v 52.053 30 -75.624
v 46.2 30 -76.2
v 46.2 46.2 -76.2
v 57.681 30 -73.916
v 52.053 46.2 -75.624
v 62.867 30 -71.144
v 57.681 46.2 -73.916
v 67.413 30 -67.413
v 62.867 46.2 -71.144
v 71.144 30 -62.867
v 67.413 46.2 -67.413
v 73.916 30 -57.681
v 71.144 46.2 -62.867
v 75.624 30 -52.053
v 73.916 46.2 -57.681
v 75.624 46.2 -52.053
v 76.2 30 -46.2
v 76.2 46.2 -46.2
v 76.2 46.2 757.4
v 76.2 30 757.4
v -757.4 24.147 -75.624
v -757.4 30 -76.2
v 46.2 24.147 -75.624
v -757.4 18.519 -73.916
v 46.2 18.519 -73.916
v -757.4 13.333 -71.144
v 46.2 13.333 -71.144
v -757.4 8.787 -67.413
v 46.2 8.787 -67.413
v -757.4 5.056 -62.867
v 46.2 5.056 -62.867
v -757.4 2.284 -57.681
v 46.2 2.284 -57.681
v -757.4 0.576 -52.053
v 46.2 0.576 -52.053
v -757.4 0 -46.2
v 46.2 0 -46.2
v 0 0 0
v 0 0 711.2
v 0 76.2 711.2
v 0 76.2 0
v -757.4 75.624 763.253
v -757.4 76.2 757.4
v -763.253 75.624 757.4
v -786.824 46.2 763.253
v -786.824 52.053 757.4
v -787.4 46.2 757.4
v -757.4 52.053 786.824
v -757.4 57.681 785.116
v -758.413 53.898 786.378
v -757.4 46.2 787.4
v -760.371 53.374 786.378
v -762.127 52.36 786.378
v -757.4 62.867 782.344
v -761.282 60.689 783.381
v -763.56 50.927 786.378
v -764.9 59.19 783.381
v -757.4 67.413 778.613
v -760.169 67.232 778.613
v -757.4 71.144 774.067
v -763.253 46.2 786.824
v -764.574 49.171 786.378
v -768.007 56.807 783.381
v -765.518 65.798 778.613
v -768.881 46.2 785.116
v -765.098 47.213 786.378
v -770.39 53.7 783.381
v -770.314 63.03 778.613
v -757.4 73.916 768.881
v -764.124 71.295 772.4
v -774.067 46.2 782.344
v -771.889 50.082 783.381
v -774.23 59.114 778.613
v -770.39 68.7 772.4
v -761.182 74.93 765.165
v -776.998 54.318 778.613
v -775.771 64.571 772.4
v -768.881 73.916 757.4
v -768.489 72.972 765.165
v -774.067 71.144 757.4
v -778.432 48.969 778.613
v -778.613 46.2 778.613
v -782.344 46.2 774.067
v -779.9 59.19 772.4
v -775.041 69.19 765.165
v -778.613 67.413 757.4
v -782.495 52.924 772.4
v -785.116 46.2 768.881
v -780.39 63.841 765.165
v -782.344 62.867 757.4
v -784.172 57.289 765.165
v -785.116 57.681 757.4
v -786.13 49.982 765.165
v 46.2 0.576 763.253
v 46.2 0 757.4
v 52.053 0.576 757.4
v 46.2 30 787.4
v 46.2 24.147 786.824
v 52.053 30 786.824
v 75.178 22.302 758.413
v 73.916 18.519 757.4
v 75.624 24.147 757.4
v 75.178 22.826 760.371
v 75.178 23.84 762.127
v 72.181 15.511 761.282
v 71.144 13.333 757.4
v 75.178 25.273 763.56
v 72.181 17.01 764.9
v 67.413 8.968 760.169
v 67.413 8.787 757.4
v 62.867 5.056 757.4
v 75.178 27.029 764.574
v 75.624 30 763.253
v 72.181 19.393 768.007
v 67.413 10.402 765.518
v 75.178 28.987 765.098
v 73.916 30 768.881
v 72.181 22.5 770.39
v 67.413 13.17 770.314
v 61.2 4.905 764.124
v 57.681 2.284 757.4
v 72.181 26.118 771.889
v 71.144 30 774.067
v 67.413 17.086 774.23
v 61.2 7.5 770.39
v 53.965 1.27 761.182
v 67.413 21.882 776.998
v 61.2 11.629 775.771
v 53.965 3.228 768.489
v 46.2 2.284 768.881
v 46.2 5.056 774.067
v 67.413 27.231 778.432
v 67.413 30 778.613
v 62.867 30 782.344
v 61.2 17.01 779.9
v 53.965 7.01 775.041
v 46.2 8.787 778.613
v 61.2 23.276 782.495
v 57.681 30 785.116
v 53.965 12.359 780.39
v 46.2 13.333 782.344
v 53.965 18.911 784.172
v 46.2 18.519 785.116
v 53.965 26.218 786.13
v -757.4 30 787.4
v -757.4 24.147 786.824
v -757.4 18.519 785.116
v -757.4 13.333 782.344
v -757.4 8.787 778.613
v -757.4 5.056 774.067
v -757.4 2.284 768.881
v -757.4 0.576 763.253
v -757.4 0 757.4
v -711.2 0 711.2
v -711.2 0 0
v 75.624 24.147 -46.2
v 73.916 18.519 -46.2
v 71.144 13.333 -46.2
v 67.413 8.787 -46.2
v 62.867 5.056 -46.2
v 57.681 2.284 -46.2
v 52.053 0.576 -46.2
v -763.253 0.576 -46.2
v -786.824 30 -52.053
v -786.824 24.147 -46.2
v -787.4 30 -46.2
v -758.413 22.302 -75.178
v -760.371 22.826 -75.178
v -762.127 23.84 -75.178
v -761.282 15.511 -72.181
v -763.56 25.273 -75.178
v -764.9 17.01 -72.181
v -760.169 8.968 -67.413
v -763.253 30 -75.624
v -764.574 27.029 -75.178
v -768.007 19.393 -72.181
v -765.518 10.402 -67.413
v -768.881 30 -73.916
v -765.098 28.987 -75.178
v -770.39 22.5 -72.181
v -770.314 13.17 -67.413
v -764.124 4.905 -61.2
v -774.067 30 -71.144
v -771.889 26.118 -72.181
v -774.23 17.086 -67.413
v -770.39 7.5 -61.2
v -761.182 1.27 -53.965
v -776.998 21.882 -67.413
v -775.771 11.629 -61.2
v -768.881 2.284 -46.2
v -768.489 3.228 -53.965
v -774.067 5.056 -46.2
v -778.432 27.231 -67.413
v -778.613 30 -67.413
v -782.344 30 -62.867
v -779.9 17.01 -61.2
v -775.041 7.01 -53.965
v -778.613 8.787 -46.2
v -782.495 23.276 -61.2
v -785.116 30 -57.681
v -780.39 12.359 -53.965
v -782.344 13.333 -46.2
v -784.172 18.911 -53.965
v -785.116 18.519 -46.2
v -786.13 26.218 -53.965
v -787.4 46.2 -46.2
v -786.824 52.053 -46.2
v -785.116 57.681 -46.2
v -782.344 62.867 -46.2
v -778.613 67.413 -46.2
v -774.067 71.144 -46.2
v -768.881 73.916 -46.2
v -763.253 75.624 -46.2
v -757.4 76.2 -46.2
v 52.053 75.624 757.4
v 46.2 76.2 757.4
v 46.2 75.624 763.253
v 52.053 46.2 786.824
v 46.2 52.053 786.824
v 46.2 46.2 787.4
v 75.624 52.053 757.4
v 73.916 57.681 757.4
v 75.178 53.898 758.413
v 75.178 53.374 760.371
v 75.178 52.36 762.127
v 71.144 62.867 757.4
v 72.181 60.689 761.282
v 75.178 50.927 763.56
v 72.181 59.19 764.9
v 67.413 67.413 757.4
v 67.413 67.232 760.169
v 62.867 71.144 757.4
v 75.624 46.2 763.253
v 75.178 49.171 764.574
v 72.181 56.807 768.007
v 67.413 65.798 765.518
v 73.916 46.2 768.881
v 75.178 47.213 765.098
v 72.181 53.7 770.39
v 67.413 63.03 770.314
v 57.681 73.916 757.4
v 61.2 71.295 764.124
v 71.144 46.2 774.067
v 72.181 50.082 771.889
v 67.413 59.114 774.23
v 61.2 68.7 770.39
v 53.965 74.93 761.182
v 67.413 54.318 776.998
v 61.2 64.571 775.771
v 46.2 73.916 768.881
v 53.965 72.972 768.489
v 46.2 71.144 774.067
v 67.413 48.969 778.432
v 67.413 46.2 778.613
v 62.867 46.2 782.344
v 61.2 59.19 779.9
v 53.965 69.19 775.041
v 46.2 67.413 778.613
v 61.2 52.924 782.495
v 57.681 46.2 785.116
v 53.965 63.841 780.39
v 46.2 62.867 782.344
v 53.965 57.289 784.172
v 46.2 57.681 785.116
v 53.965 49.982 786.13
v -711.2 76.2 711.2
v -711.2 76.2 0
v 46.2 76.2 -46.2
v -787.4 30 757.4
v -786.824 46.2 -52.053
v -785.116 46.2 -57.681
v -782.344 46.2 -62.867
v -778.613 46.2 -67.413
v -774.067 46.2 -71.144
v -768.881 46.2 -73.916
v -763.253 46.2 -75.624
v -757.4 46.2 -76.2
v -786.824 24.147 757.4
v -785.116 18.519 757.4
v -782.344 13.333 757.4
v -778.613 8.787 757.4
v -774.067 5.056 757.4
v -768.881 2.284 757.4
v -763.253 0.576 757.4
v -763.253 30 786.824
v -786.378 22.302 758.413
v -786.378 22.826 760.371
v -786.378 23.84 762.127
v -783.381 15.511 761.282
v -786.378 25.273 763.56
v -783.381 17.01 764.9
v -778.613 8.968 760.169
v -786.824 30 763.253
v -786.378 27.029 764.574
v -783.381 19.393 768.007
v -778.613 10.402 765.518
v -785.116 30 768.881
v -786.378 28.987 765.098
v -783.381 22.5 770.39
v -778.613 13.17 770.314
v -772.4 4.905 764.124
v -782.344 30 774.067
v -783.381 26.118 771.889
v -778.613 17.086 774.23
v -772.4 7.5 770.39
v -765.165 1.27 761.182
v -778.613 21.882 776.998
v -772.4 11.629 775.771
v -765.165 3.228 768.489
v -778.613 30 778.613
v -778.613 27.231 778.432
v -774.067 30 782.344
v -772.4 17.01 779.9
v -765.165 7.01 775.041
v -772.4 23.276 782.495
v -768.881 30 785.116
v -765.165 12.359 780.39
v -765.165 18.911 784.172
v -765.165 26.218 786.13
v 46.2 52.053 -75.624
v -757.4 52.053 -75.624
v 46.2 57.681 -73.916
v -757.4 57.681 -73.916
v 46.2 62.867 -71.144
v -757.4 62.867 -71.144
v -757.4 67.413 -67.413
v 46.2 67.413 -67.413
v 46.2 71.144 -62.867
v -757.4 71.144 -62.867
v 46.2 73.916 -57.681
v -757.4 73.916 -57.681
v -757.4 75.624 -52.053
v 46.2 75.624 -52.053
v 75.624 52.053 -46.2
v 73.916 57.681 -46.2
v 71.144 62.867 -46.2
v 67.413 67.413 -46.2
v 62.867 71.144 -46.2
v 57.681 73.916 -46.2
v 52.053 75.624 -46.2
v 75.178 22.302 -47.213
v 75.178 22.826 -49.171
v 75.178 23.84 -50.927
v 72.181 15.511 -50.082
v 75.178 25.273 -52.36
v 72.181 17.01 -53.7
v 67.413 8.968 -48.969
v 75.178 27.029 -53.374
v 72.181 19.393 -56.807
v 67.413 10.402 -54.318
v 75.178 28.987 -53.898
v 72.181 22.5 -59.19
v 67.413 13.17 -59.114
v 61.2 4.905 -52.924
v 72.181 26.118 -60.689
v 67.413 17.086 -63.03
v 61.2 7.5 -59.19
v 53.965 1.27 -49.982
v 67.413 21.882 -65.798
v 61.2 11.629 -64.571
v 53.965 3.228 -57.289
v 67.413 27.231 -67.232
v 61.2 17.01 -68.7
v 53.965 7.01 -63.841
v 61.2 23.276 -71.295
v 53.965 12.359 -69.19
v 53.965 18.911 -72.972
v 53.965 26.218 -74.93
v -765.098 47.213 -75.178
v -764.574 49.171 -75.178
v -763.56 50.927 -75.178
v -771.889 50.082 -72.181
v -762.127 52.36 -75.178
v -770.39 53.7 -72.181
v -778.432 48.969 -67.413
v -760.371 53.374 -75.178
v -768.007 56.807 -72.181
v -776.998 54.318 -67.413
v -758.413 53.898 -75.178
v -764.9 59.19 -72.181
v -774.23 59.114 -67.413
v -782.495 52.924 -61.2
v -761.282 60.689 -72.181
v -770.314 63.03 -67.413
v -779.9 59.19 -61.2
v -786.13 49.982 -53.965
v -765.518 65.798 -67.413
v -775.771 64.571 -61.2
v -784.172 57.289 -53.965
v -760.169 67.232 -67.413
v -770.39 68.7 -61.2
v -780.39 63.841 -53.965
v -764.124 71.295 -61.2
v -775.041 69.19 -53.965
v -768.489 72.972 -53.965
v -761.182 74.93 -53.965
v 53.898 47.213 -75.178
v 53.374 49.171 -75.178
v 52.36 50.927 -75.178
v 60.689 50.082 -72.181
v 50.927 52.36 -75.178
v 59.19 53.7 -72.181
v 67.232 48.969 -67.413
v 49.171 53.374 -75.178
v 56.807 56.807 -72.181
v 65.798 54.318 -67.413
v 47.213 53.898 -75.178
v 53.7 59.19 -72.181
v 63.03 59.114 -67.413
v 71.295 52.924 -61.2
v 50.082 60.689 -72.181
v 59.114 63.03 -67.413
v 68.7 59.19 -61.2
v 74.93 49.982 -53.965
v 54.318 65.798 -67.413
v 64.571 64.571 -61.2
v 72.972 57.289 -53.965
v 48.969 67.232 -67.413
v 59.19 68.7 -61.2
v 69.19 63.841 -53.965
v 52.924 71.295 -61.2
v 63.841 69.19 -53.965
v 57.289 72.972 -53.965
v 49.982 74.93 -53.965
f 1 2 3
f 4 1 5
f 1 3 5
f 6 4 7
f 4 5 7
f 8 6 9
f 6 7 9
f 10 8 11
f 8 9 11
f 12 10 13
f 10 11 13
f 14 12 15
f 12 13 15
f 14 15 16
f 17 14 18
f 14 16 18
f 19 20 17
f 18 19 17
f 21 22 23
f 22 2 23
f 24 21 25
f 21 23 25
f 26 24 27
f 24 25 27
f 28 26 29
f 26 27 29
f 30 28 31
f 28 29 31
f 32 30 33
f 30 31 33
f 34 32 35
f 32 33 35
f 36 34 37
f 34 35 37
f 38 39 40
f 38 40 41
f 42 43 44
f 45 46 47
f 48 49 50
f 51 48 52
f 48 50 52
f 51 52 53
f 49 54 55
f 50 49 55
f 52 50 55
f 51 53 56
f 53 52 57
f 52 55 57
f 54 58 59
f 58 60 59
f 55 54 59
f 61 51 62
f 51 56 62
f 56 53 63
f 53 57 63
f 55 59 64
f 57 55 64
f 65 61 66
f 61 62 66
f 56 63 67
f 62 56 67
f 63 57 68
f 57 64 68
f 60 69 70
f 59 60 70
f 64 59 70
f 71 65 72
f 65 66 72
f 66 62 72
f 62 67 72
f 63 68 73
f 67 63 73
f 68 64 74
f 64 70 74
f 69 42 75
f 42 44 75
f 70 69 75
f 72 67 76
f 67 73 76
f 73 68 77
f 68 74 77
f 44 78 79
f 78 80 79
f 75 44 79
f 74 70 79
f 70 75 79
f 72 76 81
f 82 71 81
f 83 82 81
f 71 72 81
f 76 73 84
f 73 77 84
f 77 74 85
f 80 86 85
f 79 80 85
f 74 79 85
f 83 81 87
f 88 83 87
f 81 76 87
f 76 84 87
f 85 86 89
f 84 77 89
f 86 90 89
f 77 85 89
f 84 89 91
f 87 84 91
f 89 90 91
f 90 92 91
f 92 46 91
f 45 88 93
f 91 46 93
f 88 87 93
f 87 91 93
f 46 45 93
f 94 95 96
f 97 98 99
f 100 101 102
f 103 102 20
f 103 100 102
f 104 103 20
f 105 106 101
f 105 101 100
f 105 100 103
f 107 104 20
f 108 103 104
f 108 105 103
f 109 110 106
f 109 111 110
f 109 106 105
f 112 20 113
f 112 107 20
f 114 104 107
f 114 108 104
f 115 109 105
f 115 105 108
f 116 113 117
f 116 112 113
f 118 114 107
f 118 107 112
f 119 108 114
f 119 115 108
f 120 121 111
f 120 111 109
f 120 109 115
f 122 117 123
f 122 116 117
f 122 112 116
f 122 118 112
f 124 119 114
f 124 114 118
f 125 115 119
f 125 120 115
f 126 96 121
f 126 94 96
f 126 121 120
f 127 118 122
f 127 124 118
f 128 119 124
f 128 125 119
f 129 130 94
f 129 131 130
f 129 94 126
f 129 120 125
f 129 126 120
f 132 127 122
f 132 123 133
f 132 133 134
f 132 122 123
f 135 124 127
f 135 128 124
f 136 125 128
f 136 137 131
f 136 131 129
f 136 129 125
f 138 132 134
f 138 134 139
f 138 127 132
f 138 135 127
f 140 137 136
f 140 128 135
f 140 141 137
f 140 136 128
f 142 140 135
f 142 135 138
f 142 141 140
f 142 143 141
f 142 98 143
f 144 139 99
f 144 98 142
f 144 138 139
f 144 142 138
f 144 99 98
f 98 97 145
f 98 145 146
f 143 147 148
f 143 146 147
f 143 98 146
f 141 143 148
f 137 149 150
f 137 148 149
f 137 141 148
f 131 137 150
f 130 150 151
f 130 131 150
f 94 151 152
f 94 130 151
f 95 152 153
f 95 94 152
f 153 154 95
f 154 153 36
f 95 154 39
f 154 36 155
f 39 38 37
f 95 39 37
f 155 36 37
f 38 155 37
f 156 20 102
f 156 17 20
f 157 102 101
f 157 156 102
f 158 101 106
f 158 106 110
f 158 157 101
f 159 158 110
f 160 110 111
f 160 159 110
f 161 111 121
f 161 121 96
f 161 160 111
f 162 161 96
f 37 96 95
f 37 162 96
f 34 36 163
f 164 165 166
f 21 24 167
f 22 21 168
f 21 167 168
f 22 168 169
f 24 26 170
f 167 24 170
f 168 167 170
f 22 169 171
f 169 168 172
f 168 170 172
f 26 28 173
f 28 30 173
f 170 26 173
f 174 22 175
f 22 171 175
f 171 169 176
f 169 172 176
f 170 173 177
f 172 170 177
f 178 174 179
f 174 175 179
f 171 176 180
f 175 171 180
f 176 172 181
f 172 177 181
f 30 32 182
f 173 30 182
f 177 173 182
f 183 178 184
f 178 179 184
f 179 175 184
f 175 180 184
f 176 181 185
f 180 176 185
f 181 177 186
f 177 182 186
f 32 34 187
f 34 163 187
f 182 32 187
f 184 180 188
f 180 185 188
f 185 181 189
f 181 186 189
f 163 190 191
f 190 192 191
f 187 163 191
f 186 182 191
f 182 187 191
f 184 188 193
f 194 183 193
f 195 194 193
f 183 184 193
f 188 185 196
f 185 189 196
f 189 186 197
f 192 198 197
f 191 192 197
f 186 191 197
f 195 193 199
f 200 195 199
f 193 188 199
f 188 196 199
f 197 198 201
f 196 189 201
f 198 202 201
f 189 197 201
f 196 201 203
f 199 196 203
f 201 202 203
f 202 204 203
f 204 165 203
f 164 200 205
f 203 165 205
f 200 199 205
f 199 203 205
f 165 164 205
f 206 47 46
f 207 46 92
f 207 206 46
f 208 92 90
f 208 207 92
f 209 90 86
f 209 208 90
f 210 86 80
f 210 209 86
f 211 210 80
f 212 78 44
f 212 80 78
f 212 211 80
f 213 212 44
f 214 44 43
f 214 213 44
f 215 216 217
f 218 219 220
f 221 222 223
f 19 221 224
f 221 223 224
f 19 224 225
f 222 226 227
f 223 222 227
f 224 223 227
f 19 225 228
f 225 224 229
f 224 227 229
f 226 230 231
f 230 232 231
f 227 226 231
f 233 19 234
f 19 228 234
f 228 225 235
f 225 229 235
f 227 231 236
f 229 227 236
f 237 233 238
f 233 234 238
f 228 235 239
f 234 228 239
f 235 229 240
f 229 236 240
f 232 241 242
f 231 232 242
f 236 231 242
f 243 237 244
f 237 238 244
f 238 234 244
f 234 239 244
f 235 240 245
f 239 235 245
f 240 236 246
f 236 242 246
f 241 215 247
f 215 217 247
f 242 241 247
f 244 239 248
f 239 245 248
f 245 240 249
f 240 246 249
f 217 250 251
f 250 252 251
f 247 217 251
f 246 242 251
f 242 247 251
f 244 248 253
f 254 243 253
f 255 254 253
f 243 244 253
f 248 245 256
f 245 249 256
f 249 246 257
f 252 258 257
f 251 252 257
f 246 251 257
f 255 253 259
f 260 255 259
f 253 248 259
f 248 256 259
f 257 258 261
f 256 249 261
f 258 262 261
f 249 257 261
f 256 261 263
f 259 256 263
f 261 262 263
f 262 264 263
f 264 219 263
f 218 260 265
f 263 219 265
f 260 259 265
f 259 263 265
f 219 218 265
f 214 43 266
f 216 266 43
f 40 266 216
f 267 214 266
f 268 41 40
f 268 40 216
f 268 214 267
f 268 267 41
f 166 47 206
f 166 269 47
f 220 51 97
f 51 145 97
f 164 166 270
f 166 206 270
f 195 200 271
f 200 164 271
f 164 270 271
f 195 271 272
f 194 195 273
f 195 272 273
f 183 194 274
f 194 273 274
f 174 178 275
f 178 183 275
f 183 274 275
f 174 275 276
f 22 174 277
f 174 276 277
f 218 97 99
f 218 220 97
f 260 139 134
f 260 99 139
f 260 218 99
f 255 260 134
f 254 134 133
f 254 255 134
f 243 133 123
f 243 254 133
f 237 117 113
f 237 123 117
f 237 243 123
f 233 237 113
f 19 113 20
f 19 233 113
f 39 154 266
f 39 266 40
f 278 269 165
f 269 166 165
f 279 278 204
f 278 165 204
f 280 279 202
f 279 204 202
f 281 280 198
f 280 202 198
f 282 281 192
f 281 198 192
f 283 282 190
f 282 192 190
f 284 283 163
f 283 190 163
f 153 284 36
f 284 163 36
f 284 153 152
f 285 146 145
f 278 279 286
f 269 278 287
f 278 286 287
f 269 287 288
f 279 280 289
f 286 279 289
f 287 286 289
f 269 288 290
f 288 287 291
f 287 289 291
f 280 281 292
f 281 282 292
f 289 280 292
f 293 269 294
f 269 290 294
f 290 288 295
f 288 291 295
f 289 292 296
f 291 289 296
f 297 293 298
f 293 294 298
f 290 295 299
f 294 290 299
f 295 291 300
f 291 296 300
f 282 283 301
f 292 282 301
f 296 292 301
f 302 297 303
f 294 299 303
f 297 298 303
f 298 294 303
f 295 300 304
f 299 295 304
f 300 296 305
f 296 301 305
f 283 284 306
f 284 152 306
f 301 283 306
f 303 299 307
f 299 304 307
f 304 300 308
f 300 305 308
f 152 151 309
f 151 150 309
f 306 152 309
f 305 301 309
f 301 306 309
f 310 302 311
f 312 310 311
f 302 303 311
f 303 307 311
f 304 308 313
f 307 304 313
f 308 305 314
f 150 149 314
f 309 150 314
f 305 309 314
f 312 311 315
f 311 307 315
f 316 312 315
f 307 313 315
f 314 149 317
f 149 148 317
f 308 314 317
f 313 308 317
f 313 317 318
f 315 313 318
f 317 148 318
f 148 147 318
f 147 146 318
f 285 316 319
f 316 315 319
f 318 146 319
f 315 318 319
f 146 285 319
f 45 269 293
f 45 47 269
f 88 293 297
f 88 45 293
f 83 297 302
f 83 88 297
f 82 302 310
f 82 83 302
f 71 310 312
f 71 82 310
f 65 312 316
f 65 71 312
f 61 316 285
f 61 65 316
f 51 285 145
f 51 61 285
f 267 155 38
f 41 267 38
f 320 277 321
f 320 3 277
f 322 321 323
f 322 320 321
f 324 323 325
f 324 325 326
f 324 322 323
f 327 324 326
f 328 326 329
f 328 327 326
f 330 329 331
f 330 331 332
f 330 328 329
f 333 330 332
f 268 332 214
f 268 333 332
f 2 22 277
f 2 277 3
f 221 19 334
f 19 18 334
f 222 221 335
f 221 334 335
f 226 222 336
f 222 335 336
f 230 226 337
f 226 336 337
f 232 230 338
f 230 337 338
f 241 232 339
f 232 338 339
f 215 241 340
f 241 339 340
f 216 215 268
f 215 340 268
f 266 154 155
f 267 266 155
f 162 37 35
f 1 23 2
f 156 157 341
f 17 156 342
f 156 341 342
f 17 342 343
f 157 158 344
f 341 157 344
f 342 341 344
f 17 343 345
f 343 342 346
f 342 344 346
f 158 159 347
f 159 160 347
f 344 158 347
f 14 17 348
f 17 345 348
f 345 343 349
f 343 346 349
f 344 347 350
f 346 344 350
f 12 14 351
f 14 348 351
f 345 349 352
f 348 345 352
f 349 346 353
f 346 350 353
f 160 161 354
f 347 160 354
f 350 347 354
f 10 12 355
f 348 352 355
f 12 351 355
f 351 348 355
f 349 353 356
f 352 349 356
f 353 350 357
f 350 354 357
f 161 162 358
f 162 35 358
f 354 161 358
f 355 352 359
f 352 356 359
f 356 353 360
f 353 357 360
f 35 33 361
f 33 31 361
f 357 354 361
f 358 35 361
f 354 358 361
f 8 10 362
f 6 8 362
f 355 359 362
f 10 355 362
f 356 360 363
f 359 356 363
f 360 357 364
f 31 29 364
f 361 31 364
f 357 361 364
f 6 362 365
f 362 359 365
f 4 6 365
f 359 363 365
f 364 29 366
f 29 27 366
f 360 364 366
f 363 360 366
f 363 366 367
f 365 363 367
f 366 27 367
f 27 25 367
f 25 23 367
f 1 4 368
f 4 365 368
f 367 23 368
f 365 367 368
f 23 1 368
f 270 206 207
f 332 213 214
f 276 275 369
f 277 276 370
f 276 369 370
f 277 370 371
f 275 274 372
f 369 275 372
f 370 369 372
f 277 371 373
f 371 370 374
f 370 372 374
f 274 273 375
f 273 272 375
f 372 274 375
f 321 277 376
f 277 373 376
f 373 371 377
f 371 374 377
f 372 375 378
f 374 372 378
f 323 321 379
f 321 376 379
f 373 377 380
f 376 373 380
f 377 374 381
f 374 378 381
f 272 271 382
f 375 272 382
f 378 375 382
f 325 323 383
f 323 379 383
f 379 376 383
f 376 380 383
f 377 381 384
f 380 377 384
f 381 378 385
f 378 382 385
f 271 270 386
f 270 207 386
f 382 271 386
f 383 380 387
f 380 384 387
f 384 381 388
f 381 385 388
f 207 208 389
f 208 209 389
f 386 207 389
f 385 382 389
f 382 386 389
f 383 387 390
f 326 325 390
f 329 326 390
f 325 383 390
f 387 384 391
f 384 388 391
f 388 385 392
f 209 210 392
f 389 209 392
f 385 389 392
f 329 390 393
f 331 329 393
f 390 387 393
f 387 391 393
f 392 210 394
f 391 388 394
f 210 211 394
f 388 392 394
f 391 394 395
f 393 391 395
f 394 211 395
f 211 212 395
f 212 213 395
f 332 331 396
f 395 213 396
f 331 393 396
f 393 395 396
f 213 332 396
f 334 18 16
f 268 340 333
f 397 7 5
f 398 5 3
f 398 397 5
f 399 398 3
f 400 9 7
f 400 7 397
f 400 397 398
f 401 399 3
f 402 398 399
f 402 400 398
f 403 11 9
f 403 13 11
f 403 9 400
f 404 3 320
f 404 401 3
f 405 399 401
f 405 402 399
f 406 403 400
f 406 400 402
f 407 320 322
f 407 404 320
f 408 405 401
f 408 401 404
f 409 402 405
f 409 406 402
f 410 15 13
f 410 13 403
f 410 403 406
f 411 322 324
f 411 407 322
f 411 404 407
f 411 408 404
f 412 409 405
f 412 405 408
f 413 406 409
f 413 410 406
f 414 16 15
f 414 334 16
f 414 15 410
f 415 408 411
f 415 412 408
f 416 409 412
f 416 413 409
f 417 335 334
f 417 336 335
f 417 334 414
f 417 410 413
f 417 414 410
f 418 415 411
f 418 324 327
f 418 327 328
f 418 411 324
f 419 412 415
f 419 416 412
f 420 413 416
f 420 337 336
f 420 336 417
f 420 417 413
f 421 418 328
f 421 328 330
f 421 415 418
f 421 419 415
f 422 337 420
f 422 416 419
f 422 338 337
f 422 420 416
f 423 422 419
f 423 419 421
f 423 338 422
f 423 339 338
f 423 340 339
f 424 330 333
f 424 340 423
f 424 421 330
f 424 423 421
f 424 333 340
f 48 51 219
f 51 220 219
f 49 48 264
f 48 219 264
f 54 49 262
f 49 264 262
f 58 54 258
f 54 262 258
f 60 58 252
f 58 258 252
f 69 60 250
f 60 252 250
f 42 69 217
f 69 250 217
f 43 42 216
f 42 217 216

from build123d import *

# Parameters (mm, degrees)
SKETCH1_W           = 863.6
SKETCH1_H           = 863.6
SKETCH1_W_2         = 711.2
SKETCH1_H_2         = 711.2
EXTRUDE_THIN1_DEPTH = 76.2
FILLET1_R           = 30


with BuildPart() as part:
    # Sketch1 → Extrude-Thin1 (new body)
    with BuildSketch(Plane(origin=(0, 0, 0), x_dir=(1, 0, 0), z_dir=(0, 1, 0))):
        with Locations((-355.6, -355.6)):
            Rectangle(SKETCH1_W, SKETCH1_H)
        with Locations((-355.6, -355.6)):
            Rectangle(SKETCH1_W_2, SKETCH1_H_2, mode=Mode.SUBTRACT)
    extrude(amount=EXTRUDE_THIN1_DEPTH)

    # Fillet1
    fillet1_edges = [part.edges().sort_by_distance(p)[0] for p in [
        (-787.4, 76.2, 355.6),
        (-355.6, 76.2, 787.4),
        (-355.6, 0, 787.4),
        (-787.4, 0, 355.6),
        (-355.6, 0, -76.2),
        (76.2, 0, 355.6),
        (76.2, 76.2, 355.6),
        (76.2, 38.1, 787.4),
        (-787.4, 38.1, 787.4),
        (-787.4, 38.1, -76.2),
        (76.2, 38.1, -76.2),
        (-355.6, 76.2, -76.2),
    ]]
    fillet(fillet1_edges, radius=FILLET1_R)


solid = part.part
